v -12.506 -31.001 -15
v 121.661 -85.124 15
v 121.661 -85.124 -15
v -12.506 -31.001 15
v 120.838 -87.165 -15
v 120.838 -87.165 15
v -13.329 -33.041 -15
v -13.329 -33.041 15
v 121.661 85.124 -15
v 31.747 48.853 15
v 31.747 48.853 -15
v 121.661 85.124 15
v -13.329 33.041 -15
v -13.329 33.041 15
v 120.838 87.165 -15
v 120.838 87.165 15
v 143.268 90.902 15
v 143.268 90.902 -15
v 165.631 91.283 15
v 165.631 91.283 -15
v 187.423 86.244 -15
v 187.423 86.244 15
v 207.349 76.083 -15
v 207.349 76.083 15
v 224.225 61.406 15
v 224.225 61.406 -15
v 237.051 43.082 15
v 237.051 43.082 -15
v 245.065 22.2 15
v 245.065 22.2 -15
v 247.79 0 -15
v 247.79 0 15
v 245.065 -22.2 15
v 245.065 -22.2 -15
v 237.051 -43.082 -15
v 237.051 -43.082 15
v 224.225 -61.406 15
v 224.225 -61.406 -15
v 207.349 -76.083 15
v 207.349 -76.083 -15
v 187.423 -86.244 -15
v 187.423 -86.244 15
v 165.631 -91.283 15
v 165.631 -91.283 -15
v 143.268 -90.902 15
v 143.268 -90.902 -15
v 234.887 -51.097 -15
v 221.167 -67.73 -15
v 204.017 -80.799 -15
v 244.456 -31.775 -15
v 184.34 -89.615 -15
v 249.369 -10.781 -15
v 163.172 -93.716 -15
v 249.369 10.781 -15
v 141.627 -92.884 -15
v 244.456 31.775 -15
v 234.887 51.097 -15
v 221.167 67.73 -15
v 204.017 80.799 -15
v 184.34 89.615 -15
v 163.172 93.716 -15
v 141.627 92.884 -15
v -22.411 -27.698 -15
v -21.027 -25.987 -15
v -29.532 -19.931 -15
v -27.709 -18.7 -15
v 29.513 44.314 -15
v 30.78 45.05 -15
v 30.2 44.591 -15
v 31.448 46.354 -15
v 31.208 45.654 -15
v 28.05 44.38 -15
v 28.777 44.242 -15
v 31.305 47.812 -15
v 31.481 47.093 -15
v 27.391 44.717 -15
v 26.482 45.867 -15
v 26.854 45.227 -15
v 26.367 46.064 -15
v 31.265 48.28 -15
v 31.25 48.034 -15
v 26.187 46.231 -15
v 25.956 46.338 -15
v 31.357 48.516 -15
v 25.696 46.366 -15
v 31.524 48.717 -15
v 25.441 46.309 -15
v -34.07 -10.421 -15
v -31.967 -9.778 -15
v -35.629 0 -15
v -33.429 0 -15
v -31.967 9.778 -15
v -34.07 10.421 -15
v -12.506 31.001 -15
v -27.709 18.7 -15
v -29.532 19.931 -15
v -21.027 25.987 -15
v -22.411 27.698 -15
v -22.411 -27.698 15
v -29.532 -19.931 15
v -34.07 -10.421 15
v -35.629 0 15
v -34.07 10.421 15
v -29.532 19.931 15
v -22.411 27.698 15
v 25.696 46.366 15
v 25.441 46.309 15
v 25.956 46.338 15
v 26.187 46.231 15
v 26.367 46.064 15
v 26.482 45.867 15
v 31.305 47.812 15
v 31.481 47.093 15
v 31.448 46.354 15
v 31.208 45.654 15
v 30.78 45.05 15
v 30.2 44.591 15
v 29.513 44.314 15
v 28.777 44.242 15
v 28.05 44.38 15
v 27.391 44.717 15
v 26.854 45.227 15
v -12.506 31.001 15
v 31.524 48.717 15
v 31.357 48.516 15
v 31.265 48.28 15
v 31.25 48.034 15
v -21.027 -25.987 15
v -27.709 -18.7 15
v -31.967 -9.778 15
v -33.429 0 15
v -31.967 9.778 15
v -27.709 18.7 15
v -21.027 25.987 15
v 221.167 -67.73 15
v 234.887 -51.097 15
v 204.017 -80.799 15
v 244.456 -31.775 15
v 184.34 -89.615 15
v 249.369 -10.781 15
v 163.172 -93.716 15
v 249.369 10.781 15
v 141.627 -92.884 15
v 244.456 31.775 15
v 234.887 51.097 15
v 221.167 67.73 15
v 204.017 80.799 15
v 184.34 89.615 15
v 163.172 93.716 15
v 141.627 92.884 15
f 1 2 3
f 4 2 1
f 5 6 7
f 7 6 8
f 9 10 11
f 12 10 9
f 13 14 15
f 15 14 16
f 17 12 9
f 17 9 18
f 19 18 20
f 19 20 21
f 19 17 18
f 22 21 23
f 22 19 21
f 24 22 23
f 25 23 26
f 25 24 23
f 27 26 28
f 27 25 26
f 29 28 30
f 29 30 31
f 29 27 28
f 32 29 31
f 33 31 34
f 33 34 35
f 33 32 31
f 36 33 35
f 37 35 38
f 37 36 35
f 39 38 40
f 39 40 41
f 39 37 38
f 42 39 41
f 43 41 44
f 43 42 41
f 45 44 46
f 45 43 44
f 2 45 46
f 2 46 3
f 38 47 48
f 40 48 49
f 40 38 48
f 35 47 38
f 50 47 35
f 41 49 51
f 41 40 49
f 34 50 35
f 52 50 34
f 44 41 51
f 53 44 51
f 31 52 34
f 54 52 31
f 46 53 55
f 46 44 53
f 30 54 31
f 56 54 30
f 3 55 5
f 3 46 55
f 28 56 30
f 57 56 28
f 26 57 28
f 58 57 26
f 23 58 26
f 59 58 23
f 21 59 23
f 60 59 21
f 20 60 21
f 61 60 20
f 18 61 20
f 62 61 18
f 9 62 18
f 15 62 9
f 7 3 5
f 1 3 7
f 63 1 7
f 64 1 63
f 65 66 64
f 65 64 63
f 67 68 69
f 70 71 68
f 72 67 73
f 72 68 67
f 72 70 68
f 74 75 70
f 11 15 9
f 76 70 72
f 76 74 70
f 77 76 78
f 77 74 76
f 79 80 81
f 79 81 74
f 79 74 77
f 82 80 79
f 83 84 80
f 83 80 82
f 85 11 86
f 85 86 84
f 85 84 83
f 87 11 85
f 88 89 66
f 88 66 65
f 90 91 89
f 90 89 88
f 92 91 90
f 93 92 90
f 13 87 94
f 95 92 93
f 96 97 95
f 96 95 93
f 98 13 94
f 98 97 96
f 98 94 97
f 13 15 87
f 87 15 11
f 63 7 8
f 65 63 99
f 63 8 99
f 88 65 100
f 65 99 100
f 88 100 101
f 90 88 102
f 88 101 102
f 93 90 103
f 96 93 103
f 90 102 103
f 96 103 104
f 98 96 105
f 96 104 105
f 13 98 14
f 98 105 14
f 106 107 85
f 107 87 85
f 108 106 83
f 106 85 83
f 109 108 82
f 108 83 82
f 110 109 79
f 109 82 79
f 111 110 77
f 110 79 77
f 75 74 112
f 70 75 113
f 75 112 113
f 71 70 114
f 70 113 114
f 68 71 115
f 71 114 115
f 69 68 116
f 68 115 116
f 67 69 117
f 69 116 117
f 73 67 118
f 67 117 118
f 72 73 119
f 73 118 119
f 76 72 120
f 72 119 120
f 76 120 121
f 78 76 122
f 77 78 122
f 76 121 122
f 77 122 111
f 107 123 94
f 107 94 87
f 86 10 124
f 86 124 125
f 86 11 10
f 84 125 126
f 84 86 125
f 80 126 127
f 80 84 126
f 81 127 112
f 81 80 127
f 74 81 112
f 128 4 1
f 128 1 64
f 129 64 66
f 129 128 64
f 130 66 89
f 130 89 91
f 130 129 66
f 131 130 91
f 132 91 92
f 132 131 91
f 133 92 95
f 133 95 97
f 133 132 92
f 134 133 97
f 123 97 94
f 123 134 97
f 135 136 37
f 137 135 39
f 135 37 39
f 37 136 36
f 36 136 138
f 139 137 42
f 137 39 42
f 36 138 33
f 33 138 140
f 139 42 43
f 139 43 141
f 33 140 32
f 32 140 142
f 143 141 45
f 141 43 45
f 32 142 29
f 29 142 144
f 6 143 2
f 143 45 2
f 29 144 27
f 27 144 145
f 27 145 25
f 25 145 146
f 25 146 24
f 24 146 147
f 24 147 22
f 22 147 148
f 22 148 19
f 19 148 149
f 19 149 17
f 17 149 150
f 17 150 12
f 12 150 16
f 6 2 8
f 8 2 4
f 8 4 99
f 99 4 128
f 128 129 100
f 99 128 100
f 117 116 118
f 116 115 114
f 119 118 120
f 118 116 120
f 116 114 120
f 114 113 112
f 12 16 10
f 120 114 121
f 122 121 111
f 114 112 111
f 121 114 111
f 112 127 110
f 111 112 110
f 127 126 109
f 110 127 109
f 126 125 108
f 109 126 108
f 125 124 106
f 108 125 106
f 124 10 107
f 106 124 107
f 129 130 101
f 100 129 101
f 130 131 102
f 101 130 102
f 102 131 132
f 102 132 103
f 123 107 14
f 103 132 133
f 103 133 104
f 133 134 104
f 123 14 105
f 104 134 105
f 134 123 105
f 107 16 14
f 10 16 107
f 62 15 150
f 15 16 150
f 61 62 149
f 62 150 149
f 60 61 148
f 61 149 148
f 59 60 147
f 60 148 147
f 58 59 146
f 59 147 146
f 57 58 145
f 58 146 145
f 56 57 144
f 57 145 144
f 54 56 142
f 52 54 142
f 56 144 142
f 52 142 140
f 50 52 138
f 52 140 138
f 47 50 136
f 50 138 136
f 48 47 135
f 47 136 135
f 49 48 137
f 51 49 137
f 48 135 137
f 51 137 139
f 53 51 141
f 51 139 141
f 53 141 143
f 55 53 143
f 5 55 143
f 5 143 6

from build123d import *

# Parameters (mm, degrees)
BOSS_EXTRUDE1_DEPTH = 15
BOSS_EXTRUDE2_DEPTH = 15
FILLET4_R           = 0.8


with BuildPart() as part:
    # Sketch1 → Boss-Extrude1 (new, symmetric)
    with BuildSketch(Plane.XY):
        with BuildLine():
            Line((-13.329010746, 33.041463317), (120.837574837, 87.164606832))
            ThreePointArc((120.837574837, 87.164606832), (249.989705965, 0), (120.837574837, -87.164606832))
            Line((120.837574837, -87.164606832), (-13.329010746, -33.041463317))
            ThreePointArc((-13.329010746, -33.041463317), (-35.628651751, 0), (-13.329010746, 33.041463317))
        make_face()
        with BuildLine():
            Line((-12.505970238, 31.001217174), (121.660615345, 85.124360689))
            ThreePointArc((121.660615345, 85.124360689), (247.789705965, 0), (121.660615345, -85.124360689))
            Line((121.660615345, -85.124360689), (-12.505970238, -31.001217174))
            ThreePointArc((-12.505970238, -31.001217174), (-33.428651751, 0), (-12.505970238, 31.001217174))
        make_face(mode=Mode.SUBTRACT)
    extrude(amount=BOSS_EXTRUDE1_DEPTH, both=True)

    # Sketch2 → Boss-Extrude2 (add, symmetric)
    with BuildSketch(Plane.XY):
        with BuildLine():
            Line((26.425162942, 46.022572764), (26.179278266, 46.606945289))
            Line((26.179278266, 46.606945289), (30.962929341, 48.536682358))
            Line((30.962929341, 48.536682358), (31.237715226, 47.963968655))
            ThreePointArc((31.237715226, 47.963968655), (29.866253214, 44.428056099), (26.425162942, 46.022572764))
        make_face()
    extrude(amount=BOSS_EXTRUDE2_DEPTH, both=True)

    # Fillet4
    fillet4_edges = [part.edges().sort_by_distance(p)[0] for p in [
        (30.962929341, 48.536682358, 0),
        (26.179278266, 46.606945289, 0),
    ]]
    fillet(fillet4_edges, radius=FILLET4_R)


solid = part.part
